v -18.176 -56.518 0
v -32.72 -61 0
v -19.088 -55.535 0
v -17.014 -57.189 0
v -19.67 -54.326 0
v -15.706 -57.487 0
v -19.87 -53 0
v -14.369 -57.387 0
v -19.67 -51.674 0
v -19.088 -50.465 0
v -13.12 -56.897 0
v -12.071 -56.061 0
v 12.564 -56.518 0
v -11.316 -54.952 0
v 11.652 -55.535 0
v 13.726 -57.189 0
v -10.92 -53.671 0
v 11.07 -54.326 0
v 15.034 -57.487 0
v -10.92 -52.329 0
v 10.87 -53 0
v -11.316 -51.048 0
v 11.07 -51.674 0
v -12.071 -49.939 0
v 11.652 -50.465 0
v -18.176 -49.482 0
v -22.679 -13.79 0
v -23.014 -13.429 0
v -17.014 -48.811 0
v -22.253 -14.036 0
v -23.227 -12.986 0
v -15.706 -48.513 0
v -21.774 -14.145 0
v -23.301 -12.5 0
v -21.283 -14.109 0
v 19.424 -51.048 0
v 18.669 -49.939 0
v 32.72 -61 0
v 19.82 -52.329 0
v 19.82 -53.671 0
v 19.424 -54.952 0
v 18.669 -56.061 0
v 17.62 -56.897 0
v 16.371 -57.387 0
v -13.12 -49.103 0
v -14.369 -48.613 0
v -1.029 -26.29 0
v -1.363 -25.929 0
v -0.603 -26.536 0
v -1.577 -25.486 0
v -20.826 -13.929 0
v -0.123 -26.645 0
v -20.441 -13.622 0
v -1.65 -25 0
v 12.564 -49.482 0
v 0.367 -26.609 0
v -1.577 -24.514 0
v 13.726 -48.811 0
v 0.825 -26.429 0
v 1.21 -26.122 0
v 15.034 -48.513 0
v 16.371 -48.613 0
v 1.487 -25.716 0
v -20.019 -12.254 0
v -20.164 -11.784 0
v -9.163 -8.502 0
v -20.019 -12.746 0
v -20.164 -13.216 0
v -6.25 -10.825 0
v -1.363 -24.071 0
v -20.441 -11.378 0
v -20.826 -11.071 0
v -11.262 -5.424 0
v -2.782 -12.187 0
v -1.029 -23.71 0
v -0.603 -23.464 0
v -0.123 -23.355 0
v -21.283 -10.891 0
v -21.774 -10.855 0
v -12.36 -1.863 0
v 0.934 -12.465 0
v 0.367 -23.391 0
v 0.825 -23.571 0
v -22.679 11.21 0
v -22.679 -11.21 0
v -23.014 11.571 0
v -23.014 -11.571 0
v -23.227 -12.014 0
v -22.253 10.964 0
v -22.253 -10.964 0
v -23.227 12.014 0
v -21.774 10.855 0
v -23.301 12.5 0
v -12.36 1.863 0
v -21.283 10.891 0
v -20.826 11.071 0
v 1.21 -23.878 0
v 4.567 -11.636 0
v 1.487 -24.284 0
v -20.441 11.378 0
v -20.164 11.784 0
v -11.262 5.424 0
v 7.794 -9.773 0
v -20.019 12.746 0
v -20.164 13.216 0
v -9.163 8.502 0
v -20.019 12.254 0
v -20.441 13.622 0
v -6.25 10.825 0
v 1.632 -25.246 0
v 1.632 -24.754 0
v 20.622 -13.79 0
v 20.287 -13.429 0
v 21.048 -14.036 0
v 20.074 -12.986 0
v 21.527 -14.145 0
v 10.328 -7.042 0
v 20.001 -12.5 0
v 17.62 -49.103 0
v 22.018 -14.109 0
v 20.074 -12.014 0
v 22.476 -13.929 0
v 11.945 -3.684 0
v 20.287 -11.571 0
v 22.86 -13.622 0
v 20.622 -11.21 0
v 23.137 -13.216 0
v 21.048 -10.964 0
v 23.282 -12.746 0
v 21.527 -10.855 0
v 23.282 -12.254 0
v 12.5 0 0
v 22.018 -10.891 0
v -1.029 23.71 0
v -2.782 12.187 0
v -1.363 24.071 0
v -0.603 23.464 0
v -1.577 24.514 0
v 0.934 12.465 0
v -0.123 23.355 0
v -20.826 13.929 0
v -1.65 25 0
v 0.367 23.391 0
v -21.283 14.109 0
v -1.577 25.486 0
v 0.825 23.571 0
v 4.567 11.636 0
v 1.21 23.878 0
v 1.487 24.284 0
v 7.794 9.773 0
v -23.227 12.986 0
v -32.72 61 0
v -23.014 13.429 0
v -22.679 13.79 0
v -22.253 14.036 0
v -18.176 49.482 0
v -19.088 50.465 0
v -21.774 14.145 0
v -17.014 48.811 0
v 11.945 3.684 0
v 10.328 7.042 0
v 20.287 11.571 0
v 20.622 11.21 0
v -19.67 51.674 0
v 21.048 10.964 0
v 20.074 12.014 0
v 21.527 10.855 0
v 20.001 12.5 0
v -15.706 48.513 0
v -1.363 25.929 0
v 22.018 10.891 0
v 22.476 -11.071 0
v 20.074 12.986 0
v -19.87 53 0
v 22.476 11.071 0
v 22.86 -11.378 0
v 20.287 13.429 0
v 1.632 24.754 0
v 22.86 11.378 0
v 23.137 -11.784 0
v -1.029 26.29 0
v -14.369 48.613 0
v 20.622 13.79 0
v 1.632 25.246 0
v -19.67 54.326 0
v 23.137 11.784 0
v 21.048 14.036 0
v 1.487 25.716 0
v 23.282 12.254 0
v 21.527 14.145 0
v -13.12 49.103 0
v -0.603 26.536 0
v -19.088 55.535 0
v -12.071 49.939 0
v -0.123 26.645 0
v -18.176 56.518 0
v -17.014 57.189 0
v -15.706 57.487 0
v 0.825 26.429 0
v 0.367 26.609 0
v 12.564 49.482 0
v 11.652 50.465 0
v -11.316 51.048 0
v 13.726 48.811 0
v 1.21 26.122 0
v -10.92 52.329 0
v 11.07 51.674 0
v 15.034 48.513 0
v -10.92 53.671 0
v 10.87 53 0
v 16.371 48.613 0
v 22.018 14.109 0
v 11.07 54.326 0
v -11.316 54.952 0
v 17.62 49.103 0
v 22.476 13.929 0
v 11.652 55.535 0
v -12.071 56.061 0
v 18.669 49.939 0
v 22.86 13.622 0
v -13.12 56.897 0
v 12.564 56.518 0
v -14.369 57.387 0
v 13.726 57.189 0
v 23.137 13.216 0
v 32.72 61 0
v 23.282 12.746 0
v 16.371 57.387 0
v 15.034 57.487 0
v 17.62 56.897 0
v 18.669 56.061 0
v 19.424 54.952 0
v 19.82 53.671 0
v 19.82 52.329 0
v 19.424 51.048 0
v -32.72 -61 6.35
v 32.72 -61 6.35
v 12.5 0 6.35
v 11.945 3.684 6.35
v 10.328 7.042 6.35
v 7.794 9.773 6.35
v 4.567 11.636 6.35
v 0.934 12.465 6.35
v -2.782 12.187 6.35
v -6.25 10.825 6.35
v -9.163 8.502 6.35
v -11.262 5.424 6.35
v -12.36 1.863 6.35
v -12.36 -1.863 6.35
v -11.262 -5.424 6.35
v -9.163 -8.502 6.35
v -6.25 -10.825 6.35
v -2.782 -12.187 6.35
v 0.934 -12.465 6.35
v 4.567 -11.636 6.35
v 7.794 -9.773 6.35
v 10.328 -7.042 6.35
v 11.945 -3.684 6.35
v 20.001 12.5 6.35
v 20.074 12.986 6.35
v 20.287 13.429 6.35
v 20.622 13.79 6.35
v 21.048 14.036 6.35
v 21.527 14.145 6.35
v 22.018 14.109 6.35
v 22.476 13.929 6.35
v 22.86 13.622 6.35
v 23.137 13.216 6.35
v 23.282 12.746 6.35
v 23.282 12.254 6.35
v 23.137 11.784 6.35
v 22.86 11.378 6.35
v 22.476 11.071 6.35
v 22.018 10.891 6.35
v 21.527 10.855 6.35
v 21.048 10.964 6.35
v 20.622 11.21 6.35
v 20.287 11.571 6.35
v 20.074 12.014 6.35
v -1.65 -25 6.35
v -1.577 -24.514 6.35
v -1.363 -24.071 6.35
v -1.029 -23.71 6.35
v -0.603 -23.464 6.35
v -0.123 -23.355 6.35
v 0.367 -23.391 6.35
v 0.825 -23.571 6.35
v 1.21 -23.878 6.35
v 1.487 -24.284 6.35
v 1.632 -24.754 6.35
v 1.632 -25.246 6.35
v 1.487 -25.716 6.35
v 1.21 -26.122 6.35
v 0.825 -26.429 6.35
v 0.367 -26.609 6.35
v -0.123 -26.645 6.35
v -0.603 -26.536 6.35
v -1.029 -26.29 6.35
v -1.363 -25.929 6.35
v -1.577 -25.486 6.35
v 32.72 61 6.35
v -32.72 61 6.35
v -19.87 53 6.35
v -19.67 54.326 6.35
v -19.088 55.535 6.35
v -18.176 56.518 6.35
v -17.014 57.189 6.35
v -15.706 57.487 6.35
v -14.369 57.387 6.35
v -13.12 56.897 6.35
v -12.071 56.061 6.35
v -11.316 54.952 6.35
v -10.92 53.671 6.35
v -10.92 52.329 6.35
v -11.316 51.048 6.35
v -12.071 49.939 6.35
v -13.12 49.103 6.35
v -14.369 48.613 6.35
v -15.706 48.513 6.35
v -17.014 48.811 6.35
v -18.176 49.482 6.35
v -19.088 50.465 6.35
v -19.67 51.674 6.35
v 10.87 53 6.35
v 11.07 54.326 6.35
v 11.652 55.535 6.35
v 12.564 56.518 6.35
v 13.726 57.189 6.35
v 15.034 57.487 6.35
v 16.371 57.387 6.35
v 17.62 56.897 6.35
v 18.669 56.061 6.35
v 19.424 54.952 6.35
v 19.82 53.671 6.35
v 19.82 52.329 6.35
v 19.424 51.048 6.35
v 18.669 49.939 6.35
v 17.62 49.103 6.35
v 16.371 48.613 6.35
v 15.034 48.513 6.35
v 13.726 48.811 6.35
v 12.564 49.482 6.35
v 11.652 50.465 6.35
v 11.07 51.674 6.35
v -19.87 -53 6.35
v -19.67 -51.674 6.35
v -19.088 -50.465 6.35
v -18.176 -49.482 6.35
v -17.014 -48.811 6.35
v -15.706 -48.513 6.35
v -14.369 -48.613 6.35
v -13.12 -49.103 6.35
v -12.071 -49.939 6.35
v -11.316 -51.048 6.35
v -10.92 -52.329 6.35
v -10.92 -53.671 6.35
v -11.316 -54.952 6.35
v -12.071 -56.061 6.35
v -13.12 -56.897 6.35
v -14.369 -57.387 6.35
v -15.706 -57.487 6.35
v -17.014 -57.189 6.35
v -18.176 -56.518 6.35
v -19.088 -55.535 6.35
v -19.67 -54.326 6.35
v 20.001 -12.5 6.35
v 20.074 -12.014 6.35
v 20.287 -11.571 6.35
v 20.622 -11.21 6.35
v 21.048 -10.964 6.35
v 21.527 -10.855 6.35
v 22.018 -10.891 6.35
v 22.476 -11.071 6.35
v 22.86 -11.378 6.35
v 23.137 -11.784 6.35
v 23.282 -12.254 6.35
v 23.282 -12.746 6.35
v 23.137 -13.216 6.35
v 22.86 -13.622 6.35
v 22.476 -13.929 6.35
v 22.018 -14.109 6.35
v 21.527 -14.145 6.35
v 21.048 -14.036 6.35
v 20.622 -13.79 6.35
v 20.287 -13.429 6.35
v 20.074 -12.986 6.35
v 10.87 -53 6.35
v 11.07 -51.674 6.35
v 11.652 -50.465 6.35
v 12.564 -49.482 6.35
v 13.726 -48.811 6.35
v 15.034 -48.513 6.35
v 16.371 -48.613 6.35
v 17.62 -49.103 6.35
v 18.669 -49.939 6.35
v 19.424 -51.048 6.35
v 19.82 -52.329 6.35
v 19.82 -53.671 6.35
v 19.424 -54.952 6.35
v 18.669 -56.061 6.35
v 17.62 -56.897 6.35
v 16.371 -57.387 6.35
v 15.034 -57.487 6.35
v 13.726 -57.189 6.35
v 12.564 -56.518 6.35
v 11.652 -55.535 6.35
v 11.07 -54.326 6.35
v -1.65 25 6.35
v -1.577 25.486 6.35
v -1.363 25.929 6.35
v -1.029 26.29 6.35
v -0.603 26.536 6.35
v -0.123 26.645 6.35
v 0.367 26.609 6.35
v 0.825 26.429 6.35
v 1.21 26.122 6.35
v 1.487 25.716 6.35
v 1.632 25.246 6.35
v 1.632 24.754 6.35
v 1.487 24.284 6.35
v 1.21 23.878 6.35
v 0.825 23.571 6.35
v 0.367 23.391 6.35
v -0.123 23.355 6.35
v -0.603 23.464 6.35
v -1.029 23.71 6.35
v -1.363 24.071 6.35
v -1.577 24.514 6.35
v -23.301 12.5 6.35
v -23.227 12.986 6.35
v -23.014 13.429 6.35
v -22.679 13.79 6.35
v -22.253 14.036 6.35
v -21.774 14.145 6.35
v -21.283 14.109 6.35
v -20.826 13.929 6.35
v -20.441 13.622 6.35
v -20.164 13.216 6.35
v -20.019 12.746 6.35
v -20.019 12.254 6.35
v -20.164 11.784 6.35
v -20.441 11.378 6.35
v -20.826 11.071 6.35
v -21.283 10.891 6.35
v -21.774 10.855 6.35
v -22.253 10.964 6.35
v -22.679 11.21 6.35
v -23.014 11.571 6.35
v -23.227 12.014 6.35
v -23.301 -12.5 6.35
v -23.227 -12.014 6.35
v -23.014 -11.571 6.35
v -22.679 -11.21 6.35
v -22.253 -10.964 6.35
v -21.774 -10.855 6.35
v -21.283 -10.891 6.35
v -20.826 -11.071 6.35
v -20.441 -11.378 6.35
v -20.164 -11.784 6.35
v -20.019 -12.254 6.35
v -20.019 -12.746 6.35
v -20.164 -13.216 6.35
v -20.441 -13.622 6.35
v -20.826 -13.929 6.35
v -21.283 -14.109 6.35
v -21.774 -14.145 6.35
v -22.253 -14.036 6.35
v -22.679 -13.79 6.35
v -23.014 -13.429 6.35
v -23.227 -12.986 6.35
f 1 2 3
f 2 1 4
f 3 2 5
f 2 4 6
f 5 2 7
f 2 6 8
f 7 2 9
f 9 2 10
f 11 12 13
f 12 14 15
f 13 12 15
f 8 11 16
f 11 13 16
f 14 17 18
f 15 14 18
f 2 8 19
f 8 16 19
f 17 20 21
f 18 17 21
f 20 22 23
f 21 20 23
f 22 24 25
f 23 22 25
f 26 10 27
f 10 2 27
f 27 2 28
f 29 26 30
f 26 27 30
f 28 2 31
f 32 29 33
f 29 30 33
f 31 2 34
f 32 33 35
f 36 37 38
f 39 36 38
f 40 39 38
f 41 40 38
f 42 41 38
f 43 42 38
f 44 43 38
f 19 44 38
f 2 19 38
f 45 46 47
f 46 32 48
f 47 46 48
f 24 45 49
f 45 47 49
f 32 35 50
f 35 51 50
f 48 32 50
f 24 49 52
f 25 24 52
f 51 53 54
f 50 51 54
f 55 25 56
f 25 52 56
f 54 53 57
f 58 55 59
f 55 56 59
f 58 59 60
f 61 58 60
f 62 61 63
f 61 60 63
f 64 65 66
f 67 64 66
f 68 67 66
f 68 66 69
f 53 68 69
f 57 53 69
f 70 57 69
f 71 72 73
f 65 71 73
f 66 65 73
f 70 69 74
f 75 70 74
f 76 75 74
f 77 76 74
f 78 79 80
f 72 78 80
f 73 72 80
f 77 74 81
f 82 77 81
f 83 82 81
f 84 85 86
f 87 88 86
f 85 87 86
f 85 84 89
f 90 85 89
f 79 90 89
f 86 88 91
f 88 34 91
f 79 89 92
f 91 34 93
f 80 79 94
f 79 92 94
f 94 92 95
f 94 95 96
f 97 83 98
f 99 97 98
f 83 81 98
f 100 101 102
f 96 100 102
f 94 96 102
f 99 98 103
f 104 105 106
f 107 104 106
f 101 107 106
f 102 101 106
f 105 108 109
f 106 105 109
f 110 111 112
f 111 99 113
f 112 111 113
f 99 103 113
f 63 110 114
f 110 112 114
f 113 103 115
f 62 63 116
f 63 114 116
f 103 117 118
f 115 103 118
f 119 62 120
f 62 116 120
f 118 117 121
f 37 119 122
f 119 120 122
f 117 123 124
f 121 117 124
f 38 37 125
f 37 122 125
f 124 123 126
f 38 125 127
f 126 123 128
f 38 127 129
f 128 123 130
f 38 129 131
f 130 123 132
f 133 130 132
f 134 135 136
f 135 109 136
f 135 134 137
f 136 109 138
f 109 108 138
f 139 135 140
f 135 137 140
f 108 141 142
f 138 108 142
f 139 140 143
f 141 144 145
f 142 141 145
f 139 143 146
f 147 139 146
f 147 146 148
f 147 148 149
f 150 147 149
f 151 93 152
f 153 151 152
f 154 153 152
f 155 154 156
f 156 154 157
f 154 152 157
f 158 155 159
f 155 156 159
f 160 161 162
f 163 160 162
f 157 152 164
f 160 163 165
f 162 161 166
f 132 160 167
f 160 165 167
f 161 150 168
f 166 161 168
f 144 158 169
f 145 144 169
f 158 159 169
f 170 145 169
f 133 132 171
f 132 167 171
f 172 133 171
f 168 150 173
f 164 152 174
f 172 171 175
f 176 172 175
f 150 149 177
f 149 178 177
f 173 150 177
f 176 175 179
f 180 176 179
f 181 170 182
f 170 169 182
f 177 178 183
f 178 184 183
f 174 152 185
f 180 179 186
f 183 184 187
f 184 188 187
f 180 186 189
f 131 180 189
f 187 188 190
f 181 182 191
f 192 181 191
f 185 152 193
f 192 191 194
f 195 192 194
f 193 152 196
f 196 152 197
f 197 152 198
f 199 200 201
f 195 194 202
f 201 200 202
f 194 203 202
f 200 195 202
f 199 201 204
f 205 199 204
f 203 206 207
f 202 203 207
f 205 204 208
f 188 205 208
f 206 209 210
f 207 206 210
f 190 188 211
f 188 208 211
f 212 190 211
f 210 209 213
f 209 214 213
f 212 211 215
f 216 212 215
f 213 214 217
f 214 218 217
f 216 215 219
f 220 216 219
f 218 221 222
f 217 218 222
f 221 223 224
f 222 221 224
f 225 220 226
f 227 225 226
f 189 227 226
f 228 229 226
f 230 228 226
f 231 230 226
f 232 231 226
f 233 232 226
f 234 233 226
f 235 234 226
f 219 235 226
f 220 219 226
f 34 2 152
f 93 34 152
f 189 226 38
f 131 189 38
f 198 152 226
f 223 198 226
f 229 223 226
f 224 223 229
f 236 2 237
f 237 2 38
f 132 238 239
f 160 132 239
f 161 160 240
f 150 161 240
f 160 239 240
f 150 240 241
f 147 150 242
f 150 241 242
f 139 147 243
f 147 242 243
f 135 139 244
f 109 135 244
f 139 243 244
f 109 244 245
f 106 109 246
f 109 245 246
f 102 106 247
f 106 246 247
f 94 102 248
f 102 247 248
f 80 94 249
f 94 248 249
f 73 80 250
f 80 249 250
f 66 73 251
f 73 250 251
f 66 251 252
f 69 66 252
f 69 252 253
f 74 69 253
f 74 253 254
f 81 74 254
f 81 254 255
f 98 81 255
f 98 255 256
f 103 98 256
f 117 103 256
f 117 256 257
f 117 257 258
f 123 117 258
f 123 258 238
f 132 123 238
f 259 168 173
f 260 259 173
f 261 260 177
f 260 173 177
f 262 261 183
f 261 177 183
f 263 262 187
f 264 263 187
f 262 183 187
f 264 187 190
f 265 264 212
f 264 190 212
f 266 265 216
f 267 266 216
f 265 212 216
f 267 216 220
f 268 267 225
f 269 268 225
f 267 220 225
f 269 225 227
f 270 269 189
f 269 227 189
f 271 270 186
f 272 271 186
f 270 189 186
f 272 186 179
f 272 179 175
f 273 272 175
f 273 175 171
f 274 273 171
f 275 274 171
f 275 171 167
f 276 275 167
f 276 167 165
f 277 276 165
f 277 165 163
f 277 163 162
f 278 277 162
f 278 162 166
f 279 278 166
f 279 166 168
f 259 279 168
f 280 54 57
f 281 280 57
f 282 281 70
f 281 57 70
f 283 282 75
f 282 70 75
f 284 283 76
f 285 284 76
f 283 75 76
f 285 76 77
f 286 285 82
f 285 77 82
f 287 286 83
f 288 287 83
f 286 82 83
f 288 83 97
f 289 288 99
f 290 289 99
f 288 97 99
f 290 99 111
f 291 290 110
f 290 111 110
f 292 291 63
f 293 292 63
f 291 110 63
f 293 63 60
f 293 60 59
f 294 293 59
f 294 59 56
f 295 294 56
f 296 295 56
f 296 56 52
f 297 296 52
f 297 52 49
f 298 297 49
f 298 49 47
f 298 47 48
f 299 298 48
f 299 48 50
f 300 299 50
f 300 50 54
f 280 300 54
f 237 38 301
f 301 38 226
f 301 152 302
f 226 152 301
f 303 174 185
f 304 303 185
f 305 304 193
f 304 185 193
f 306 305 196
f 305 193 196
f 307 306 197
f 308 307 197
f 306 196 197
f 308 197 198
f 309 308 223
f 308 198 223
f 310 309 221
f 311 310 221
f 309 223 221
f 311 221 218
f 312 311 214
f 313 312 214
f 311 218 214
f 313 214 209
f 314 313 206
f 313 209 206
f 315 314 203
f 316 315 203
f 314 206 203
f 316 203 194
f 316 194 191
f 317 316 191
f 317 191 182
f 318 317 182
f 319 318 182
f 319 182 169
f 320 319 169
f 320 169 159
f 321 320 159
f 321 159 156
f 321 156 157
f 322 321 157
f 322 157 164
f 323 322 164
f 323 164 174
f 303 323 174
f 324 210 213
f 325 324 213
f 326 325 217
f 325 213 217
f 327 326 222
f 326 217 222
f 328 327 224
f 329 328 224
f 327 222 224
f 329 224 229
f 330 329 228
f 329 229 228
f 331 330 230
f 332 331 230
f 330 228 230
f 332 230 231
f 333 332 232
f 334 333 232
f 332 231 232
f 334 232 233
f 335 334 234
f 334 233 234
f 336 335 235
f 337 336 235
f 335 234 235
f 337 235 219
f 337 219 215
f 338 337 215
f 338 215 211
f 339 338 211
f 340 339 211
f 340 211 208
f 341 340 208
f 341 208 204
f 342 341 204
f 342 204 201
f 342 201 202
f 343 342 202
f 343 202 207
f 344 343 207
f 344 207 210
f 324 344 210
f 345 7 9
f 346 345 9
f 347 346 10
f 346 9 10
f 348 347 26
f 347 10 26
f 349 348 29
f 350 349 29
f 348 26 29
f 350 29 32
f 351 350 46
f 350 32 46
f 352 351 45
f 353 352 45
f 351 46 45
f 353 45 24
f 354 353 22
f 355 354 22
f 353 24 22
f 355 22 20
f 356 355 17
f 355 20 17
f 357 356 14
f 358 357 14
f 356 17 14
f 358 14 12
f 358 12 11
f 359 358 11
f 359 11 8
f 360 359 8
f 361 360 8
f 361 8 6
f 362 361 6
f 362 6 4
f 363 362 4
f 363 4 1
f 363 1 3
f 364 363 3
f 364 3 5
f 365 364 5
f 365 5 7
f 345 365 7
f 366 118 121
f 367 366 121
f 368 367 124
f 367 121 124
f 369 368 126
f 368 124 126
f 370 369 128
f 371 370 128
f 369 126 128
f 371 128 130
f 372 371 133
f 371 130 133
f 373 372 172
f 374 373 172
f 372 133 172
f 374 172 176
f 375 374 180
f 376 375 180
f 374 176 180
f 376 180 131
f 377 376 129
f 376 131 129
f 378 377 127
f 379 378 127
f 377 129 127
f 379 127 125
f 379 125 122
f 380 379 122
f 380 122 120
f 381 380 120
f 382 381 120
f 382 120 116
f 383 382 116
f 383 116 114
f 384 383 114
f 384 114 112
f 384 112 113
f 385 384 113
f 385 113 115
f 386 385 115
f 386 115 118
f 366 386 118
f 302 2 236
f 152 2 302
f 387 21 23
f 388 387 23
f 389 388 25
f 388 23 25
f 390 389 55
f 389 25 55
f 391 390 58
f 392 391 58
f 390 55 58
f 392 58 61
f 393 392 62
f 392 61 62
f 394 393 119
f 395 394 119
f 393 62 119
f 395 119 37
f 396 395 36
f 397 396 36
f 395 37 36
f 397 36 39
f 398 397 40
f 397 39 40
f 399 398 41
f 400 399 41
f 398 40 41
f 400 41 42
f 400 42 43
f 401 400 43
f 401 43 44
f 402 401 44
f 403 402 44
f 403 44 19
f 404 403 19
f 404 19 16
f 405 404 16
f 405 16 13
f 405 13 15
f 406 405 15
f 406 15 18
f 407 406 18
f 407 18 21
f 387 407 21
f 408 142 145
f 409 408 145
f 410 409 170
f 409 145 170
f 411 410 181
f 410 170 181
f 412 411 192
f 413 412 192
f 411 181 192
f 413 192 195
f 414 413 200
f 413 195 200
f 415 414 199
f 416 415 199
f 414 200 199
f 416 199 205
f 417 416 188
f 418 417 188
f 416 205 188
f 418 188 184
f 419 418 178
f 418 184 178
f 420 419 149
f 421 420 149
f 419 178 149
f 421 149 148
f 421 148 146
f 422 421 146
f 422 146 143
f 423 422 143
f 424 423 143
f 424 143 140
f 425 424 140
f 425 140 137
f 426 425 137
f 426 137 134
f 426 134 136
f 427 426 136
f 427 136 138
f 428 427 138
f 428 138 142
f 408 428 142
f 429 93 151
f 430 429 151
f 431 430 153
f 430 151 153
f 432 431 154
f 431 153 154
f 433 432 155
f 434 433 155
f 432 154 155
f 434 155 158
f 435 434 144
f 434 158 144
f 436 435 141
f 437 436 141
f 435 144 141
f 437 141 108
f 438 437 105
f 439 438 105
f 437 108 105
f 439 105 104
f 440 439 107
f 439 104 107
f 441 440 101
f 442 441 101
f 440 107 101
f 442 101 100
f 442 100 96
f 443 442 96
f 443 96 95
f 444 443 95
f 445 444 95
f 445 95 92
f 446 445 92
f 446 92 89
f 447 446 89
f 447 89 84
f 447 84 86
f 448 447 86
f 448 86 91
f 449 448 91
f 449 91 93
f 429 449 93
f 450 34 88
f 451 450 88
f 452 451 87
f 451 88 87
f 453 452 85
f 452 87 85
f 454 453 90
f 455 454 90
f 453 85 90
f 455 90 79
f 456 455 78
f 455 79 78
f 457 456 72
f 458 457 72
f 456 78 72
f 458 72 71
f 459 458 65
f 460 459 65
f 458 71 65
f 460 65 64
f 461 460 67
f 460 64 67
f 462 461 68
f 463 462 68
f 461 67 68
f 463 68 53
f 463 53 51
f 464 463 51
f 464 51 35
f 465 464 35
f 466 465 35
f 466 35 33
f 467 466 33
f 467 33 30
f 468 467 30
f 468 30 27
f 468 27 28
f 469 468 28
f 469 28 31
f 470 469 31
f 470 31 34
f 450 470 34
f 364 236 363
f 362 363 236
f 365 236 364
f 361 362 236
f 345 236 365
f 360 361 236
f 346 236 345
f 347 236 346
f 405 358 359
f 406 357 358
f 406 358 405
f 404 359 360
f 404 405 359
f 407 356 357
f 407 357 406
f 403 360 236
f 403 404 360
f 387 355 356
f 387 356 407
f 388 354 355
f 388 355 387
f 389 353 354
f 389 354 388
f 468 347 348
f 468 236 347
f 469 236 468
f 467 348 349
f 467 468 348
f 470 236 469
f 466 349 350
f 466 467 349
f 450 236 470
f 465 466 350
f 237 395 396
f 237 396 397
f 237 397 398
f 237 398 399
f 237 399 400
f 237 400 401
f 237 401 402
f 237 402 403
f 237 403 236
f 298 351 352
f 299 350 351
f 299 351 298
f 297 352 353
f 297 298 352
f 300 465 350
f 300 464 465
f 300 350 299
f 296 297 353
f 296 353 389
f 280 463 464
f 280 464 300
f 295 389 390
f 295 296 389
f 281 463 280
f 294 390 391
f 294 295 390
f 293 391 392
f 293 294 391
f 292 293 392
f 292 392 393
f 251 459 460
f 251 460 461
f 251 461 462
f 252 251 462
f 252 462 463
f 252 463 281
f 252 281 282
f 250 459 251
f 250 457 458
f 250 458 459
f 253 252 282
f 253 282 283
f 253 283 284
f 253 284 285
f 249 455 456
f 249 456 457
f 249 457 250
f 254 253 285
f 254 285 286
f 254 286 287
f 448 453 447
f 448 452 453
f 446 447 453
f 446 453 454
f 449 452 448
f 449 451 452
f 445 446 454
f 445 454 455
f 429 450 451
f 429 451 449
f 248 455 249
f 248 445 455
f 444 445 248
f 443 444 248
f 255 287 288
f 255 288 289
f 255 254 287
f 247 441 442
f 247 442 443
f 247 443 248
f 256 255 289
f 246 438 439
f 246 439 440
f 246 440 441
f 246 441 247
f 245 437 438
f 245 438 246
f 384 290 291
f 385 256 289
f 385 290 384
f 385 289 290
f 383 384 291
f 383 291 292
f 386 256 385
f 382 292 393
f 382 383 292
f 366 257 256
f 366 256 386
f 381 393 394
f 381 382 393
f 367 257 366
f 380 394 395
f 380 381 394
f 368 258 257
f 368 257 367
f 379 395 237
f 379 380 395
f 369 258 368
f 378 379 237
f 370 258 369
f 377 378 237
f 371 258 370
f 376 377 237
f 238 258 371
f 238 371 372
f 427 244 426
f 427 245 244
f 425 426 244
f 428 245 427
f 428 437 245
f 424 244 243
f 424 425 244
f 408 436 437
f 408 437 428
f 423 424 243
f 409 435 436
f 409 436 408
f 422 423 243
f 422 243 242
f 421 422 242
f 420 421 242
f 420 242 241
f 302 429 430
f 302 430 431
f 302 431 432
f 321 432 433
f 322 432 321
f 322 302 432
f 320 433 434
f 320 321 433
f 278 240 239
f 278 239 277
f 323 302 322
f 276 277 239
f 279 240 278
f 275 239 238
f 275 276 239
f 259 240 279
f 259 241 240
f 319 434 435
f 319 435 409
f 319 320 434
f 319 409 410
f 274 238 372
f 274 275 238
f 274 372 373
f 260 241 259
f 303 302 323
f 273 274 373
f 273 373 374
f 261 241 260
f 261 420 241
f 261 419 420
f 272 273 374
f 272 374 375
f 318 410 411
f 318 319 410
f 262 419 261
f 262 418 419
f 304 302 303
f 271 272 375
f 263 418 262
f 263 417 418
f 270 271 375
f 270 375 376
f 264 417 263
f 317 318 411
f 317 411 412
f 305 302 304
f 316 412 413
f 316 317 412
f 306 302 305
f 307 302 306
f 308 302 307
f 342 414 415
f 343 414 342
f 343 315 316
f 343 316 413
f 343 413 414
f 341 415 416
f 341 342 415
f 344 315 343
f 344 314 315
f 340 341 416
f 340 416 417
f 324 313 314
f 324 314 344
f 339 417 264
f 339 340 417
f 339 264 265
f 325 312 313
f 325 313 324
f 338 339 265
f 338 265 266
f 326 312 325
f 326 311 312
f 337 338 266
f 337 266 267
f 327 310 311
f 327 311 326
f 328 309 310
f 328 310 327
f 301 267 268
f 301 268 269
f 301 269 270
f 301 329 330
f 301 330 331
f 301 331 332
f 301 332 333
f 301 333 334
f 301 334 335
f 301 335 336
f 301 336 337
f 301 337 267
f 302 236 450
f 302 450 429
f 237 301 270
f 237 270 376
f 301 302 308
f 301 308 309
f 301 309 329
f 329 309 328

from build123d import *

# Parameters (mm, degrees)
SKETCH1_W                 = 65.44
SKETCH1_H                 = 122
BOSS_EXTRUDE1_DEPTH       = 6.35
M4X0_7_TAPPED_HOLE1_D     = 3.3
M4X0_7_TAPPED_HOLE1_DEPTH = 6.35
M8_CLEARANCE_HOLE1_D      = 9
M8_CLEARANCE_HOLE1_DEPTH  = 6.35
CUT_EXTRUDE2_REACH        = 8.35
SKETCH14_R                = 12.5


with BuildPart() as part:
    # Sketch1 → Boss-Extrude1 (new body)
    with BuildSketch(Plane.XY):
        Rectangle(SKETCH1_W, SKETCH1_H)
    extrude(amount=BOSS_EXTRUDE1_DEPTH)

    # M4x0.7 Tapped Hole1
    with Locations(Plane.XY.offset(6.35)):
        with Locations((0, 25), (-21.650635095, 12.5), (-21.650635095, -12.5), (0, -25), (21.650635095, -12.5), (21.650635095, 12.5)):
            Hole(M4X0_7_TAPPED_HOLE1_D / 2, depth=M4X0_7_TAPPED_HOLE1_DEPTH)

    # M8 Clearance Hole1
    with Locations(Plane.XY.offset(6.35)):
        with Locations((-15.37, 53), (15.37, 53), (15.37, -53), (-15.37, -53)):
            Hole(M8_CLEARANCE_HOLE1_D / 2, depth=M8_CLEARANCE_HOLE1_DEPTH)

    # Sketch14 → Cut-Extrude2 (cut, up to next)
    with BuildSketch(Plane.XY.offset(6.35), mode=Mode.PRIVATE) as cut_extrude2_sk1:
        Circle(SKETCH14_R)
    cut_extrude2_tool1 = extrude(cut_extrude2_sk1.sketch, amount=-CUT_EXTRUDE2_REACH, mode=Mode.PRIVATE) & part.part
    add(cut_extrude2_tool1.solids().sort_by_distance((0, 0, 6.35))[0], mode=Mode.SUBTRACT)


solid = part.part
